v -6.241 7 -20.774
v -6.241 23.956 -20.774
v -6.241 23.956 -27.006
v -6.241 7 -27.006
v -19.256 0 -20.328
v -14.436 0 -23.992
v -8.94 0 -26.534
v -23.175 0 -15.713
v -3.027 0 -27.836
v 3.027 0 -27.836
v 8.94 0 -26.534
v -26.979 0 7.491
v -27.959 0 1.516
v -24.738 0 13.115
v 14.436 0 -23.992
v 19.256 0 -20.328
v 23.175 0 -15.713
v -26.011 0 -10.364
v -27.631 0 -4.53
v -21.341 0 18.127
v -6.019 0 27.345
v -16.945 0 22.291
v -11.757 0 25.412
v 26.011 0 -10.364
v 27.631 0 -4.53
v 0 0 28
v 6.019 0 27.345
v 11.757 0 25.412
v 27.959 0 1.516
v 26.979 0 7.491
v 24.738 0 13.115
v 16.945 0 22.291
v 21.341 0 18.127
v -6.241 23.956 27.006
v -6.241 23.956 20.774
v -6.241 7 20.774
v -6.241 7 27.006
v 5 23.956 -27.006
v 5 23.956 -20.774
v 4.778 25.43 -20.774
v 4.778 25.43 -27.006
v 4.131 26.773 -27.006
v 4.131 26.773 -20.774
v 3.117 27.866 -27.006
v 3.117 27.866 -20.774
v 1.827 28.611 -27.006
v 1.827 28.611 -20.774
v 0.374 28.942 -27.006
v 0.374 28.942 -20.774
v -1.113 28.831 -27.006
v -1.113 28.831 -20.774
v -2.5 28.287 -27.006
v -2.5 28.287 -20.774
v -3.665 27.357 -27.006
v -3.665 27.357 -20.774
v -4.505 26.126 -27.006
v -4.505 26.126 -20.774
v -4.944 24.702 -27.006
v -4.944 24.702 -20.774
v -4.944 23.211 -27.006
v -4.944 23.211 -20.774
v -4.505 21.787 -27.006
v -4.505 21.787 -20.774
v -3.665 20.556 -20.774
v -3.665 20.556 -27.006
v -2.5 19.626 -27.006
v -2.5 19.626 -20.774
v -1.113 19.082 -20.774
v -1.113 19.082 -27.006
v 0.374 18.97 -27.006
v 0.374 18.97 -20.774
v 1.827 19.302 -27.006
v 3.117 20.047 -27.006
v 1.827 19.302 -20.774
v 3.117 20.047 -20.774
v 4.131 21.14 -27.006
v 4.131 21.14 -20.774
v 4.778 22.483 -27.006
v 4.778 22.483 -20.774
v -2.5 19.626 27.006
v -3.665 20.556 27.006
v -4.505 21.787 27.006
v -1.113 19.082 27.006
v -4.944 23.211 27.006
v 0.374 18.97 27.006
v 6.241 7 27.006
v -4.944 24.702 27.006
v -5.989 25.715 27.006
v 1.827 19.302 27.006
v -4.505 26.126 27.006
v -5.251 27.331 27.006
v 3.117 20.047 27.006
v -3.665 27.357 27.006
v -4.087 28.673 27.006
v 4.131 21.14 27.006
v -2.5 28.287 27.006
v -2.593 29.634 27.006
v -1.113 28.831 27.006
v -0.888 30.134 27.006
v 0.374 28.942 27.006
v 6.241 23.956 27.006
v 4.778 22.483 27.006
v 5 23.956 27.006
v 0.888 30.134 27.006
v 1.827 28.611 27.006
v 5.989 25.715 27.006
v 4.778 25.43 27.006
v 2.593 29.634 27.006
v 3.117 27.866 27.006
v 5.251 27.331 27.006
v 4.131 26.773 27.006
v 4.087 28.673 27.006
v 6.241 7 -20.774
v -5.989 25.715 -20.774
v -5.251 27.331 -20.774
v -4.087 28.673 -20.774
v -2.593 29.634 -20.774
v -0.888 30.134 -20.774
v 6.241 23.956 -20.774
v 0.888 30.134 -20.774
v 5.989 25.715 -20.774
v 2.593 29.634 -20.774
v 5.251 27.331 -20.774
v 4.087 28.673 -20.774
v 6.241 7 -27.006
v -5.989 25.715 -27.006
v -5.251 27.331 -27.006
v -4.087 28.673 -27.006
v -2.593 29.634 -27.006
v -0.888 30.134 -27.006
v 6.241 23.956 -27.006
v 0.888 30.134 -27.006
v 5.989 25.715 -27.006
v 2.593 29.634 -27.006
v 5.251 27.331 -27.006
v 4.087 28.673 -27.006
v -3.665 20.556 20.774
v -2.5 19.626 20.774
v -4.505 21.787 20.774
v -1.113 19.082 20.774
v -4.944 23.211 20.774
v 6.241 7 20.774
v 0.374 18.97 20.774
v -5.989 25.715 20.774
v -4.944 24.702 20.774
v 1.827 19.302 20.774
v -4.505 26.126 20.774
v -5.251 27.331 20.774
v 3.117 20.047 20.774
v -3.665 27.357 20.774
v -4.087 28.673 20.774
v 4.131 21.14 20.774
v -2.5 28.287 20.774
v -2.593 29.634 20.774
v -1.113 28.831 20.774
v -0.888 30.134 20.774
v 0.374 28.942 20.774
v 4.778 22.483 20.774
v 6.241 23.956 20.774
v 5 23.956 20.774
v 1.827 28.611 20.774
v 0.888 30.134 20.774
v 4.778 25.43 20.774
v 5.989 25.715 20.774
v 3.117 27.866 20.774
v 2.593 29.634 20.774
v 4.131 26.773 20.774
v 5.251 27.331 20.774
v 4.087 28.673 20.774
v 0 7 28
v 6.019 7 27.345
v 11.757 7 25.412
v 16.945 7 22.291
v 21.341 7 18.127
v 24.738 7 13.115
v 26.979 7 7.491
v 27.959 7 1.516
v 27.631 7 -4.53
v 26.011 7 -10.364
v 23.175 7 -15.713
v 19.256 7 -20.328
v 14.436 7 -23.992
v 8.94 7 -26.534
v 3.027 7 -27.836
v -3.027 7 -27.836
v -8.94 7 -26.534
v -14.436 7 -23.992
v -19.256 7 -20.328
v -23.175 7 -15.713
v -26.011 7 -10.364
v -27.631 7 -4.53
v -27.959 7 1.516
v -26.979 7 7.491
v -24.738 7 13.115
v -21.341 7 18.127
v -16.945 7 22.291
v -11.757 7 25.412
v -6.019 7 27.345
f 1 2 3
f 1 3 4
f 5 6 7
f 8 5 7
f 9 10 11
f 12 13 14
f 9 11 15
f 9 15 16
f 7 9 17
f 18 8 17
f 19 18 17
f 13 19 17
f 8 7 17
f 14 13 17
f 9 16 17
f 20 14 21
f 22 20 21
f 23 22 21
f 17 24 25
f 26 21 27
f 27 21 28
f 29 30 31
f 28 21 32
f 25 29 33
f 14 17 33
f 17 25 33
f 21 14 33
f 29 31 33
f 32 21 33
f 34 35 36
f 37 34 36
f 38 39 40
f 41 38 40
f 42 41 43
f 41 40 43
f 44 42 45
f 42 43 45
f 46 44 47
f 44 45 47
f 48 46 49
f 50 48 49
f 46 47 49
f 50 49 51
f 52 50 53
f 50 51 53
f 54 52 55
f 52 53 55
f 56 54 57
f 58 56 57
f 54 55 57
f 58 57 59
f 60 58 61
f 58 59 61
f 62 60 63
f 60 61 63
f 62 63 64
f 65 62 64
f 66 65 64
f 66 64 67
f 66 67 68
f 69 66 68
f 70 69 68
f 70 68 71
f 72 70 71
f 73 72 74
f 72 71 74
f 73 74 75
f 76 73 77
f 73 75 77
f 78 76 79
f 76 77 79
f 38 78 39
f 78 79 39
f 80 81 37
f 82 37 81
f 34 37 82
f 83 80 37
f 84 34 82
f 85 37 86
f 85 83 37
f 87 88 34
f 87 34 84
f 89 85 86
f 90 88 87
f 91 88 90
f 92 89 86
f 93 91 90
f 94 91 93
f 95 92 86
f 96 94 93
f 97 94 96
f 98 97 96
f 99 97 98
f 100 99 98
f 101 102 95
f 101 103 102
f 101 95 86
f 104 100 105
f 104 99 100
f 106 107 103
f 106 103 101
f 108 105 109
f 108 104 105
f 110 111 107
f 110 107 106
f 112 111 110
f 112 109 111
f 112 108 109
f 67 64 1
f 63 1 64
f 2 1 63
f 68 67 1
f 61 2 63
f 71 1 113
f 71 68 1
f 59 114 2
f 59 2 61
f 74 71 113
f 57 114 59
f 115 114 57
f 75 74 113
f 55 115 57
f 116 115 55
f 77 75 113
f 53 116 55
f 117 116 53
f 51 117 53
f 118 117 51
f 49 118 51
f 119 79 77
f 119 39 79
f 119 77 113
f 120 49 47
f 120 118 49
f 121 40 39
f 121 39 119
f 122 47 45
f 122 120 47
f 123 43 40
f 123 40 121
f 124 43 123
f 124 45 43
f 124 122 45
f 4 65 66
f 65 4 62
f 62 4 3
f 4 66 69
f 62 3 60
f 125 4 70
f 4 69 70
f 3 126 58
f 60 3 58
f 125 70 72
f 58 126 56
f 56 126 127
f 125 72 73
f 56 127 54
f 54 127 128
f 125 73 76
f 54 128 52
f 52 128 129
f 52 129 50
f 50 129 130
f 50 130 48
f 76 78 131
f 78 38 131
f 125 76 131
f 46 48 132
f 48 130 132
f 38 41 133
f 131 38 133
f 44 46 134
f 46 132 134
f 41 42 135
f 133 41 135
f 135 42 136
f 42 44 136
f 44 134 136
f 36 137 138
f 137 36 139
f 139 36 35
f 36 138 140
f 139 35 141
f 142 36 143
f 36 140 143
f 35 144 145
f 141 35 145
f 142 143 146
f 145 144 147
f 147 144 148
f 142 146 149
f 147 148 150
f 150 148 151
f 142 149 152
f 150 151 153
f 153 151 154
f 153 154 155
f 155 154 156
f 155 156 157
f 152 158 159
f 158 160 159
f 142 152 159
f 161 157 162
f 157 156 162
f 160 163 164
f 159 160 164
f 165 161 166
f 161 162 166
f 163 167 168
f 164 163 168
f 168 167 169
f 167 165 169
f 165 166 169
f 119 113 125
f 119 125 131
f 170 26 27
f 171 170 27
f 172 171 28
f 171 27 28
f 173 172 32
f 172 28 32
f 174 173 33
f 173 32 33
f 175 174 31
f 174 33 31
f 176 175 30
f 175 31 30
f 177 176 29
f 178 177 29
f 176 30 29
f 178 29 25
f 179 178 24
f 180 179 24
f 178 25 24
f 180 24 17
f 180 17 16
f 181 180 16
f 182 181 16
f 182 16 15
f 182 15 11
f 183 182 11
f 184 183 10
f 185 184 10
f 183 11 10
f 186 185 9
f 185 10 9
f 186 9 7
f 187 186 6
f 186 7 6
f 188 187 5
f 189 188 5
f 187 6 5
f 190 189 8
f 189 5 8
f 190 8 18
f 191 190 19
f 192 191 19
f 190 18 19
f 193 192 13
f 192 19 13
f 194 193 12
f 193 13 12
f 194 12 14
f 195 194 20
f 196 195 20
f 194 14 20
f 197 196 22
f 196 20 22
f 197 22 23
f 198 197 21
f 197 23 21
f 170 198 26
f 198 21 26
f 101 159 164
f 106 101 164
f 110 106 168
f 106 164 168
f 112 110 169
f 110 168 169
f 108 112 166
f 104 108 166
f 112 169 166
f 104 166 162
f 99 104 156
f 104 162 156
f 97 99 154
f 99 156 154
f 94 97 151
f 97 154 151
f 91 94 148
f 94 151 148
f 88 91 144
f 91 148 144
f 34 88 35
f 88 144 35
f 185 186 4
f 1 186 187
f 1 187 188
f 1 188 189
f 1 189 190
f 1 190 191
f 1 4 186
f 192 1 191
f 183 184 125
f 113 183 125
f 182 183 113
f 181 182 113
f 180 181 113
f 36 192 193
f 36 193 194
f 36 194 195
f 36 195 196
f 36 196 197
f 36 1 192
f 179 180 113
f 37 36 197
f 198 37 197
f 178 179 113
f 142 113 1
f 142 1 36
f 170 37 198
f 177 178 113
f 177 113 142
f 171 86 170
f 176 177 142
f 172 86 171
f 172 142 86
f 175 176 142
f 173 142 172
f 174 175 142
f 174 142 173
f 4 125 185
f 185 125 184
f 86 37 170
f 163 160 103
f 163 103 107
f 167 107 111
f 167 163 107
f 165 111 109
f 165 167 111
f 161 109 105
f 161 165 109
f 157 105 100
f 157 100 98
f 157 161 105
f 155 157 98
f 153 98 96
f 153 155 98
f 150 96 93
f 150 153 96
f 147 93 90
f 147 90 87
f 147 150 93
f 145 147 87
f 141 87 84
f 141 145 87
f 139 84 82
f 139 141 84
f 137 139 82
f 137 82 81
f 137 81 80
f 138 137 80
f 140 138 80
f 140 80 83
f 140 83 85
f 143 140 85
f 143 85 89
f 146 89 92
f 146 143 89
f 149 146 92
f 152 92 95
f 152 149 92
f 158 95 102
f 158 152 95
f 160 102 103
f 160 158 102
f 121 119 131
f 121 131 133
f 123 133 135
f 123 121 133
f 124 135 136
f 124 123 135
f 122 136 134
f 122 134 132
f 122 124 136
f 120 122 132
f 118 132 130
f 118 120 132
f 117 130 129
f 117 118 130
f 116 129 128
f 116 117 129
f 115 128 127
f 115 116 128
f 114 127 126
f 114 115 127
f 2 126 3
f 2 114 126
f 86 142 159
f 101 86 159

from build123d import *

# Parameters (mm, degrees)
SKETCH1_R           = 28
BOSS_EXTRUDE1_DEPTH = 7
BOSS_EXTRUDE2_START = -1.226475693
SKETCH4_R           = 5
BOSS_EXTRUDE2_DEPTH = 6.232399738


with BuildPart() as part:
    # Sketch1 → Boss-Extrude1 (new body)
    with BuildSketch(Plane(origin=(0, 0, 0), x_dir=(1, 0, 0), z_dir=(0, 1, 0))):
        with Locations(Location((0, 0, 0), (0, 0, 270))):
            Circle(SKETCH1_R)
    extrude(amount=BOSS_EXTRUDE1_DEPTH)

    # Sketch4 → Boss-Extrude2 (add)
    with BuildSketch(Plane.XY.offset(22).offset(BOSS_EXTRUDE2_START)):
        with BuildLine():
            Line((-6.241476895, 15.467624234), (-6.241476895, 7))
            ThreePointArc((-6.241476895, 7), (0, 5.970563029), (6.241476895, 7))
            Line((6.241476895, 7), (6.241476895, 15.467624234))
            Line((6.241476895, 15.467624234), (6.241476895, 23.956480862))
            ThreePointArc((6.241476895, 23.956480862), (0, 30.197957757), (-6.241476895, 23.956480862))
            Line((-6.241476895, 23.956480862), (-6.241476895, 15.467624234))
        make_face()
        with Locations((0, 23.956480862)):
            Circle(SKETCH4_R, mode=Mode.SUBTRACT)
    boss_extrude2 = extrude(amount=BOSS_EXTRUDE2_DEPTH)

    # Mirror1: Boss-Extrude2 across plane
    add(boss_extrude2.mirror(Plane.XY))


solid = part.part
